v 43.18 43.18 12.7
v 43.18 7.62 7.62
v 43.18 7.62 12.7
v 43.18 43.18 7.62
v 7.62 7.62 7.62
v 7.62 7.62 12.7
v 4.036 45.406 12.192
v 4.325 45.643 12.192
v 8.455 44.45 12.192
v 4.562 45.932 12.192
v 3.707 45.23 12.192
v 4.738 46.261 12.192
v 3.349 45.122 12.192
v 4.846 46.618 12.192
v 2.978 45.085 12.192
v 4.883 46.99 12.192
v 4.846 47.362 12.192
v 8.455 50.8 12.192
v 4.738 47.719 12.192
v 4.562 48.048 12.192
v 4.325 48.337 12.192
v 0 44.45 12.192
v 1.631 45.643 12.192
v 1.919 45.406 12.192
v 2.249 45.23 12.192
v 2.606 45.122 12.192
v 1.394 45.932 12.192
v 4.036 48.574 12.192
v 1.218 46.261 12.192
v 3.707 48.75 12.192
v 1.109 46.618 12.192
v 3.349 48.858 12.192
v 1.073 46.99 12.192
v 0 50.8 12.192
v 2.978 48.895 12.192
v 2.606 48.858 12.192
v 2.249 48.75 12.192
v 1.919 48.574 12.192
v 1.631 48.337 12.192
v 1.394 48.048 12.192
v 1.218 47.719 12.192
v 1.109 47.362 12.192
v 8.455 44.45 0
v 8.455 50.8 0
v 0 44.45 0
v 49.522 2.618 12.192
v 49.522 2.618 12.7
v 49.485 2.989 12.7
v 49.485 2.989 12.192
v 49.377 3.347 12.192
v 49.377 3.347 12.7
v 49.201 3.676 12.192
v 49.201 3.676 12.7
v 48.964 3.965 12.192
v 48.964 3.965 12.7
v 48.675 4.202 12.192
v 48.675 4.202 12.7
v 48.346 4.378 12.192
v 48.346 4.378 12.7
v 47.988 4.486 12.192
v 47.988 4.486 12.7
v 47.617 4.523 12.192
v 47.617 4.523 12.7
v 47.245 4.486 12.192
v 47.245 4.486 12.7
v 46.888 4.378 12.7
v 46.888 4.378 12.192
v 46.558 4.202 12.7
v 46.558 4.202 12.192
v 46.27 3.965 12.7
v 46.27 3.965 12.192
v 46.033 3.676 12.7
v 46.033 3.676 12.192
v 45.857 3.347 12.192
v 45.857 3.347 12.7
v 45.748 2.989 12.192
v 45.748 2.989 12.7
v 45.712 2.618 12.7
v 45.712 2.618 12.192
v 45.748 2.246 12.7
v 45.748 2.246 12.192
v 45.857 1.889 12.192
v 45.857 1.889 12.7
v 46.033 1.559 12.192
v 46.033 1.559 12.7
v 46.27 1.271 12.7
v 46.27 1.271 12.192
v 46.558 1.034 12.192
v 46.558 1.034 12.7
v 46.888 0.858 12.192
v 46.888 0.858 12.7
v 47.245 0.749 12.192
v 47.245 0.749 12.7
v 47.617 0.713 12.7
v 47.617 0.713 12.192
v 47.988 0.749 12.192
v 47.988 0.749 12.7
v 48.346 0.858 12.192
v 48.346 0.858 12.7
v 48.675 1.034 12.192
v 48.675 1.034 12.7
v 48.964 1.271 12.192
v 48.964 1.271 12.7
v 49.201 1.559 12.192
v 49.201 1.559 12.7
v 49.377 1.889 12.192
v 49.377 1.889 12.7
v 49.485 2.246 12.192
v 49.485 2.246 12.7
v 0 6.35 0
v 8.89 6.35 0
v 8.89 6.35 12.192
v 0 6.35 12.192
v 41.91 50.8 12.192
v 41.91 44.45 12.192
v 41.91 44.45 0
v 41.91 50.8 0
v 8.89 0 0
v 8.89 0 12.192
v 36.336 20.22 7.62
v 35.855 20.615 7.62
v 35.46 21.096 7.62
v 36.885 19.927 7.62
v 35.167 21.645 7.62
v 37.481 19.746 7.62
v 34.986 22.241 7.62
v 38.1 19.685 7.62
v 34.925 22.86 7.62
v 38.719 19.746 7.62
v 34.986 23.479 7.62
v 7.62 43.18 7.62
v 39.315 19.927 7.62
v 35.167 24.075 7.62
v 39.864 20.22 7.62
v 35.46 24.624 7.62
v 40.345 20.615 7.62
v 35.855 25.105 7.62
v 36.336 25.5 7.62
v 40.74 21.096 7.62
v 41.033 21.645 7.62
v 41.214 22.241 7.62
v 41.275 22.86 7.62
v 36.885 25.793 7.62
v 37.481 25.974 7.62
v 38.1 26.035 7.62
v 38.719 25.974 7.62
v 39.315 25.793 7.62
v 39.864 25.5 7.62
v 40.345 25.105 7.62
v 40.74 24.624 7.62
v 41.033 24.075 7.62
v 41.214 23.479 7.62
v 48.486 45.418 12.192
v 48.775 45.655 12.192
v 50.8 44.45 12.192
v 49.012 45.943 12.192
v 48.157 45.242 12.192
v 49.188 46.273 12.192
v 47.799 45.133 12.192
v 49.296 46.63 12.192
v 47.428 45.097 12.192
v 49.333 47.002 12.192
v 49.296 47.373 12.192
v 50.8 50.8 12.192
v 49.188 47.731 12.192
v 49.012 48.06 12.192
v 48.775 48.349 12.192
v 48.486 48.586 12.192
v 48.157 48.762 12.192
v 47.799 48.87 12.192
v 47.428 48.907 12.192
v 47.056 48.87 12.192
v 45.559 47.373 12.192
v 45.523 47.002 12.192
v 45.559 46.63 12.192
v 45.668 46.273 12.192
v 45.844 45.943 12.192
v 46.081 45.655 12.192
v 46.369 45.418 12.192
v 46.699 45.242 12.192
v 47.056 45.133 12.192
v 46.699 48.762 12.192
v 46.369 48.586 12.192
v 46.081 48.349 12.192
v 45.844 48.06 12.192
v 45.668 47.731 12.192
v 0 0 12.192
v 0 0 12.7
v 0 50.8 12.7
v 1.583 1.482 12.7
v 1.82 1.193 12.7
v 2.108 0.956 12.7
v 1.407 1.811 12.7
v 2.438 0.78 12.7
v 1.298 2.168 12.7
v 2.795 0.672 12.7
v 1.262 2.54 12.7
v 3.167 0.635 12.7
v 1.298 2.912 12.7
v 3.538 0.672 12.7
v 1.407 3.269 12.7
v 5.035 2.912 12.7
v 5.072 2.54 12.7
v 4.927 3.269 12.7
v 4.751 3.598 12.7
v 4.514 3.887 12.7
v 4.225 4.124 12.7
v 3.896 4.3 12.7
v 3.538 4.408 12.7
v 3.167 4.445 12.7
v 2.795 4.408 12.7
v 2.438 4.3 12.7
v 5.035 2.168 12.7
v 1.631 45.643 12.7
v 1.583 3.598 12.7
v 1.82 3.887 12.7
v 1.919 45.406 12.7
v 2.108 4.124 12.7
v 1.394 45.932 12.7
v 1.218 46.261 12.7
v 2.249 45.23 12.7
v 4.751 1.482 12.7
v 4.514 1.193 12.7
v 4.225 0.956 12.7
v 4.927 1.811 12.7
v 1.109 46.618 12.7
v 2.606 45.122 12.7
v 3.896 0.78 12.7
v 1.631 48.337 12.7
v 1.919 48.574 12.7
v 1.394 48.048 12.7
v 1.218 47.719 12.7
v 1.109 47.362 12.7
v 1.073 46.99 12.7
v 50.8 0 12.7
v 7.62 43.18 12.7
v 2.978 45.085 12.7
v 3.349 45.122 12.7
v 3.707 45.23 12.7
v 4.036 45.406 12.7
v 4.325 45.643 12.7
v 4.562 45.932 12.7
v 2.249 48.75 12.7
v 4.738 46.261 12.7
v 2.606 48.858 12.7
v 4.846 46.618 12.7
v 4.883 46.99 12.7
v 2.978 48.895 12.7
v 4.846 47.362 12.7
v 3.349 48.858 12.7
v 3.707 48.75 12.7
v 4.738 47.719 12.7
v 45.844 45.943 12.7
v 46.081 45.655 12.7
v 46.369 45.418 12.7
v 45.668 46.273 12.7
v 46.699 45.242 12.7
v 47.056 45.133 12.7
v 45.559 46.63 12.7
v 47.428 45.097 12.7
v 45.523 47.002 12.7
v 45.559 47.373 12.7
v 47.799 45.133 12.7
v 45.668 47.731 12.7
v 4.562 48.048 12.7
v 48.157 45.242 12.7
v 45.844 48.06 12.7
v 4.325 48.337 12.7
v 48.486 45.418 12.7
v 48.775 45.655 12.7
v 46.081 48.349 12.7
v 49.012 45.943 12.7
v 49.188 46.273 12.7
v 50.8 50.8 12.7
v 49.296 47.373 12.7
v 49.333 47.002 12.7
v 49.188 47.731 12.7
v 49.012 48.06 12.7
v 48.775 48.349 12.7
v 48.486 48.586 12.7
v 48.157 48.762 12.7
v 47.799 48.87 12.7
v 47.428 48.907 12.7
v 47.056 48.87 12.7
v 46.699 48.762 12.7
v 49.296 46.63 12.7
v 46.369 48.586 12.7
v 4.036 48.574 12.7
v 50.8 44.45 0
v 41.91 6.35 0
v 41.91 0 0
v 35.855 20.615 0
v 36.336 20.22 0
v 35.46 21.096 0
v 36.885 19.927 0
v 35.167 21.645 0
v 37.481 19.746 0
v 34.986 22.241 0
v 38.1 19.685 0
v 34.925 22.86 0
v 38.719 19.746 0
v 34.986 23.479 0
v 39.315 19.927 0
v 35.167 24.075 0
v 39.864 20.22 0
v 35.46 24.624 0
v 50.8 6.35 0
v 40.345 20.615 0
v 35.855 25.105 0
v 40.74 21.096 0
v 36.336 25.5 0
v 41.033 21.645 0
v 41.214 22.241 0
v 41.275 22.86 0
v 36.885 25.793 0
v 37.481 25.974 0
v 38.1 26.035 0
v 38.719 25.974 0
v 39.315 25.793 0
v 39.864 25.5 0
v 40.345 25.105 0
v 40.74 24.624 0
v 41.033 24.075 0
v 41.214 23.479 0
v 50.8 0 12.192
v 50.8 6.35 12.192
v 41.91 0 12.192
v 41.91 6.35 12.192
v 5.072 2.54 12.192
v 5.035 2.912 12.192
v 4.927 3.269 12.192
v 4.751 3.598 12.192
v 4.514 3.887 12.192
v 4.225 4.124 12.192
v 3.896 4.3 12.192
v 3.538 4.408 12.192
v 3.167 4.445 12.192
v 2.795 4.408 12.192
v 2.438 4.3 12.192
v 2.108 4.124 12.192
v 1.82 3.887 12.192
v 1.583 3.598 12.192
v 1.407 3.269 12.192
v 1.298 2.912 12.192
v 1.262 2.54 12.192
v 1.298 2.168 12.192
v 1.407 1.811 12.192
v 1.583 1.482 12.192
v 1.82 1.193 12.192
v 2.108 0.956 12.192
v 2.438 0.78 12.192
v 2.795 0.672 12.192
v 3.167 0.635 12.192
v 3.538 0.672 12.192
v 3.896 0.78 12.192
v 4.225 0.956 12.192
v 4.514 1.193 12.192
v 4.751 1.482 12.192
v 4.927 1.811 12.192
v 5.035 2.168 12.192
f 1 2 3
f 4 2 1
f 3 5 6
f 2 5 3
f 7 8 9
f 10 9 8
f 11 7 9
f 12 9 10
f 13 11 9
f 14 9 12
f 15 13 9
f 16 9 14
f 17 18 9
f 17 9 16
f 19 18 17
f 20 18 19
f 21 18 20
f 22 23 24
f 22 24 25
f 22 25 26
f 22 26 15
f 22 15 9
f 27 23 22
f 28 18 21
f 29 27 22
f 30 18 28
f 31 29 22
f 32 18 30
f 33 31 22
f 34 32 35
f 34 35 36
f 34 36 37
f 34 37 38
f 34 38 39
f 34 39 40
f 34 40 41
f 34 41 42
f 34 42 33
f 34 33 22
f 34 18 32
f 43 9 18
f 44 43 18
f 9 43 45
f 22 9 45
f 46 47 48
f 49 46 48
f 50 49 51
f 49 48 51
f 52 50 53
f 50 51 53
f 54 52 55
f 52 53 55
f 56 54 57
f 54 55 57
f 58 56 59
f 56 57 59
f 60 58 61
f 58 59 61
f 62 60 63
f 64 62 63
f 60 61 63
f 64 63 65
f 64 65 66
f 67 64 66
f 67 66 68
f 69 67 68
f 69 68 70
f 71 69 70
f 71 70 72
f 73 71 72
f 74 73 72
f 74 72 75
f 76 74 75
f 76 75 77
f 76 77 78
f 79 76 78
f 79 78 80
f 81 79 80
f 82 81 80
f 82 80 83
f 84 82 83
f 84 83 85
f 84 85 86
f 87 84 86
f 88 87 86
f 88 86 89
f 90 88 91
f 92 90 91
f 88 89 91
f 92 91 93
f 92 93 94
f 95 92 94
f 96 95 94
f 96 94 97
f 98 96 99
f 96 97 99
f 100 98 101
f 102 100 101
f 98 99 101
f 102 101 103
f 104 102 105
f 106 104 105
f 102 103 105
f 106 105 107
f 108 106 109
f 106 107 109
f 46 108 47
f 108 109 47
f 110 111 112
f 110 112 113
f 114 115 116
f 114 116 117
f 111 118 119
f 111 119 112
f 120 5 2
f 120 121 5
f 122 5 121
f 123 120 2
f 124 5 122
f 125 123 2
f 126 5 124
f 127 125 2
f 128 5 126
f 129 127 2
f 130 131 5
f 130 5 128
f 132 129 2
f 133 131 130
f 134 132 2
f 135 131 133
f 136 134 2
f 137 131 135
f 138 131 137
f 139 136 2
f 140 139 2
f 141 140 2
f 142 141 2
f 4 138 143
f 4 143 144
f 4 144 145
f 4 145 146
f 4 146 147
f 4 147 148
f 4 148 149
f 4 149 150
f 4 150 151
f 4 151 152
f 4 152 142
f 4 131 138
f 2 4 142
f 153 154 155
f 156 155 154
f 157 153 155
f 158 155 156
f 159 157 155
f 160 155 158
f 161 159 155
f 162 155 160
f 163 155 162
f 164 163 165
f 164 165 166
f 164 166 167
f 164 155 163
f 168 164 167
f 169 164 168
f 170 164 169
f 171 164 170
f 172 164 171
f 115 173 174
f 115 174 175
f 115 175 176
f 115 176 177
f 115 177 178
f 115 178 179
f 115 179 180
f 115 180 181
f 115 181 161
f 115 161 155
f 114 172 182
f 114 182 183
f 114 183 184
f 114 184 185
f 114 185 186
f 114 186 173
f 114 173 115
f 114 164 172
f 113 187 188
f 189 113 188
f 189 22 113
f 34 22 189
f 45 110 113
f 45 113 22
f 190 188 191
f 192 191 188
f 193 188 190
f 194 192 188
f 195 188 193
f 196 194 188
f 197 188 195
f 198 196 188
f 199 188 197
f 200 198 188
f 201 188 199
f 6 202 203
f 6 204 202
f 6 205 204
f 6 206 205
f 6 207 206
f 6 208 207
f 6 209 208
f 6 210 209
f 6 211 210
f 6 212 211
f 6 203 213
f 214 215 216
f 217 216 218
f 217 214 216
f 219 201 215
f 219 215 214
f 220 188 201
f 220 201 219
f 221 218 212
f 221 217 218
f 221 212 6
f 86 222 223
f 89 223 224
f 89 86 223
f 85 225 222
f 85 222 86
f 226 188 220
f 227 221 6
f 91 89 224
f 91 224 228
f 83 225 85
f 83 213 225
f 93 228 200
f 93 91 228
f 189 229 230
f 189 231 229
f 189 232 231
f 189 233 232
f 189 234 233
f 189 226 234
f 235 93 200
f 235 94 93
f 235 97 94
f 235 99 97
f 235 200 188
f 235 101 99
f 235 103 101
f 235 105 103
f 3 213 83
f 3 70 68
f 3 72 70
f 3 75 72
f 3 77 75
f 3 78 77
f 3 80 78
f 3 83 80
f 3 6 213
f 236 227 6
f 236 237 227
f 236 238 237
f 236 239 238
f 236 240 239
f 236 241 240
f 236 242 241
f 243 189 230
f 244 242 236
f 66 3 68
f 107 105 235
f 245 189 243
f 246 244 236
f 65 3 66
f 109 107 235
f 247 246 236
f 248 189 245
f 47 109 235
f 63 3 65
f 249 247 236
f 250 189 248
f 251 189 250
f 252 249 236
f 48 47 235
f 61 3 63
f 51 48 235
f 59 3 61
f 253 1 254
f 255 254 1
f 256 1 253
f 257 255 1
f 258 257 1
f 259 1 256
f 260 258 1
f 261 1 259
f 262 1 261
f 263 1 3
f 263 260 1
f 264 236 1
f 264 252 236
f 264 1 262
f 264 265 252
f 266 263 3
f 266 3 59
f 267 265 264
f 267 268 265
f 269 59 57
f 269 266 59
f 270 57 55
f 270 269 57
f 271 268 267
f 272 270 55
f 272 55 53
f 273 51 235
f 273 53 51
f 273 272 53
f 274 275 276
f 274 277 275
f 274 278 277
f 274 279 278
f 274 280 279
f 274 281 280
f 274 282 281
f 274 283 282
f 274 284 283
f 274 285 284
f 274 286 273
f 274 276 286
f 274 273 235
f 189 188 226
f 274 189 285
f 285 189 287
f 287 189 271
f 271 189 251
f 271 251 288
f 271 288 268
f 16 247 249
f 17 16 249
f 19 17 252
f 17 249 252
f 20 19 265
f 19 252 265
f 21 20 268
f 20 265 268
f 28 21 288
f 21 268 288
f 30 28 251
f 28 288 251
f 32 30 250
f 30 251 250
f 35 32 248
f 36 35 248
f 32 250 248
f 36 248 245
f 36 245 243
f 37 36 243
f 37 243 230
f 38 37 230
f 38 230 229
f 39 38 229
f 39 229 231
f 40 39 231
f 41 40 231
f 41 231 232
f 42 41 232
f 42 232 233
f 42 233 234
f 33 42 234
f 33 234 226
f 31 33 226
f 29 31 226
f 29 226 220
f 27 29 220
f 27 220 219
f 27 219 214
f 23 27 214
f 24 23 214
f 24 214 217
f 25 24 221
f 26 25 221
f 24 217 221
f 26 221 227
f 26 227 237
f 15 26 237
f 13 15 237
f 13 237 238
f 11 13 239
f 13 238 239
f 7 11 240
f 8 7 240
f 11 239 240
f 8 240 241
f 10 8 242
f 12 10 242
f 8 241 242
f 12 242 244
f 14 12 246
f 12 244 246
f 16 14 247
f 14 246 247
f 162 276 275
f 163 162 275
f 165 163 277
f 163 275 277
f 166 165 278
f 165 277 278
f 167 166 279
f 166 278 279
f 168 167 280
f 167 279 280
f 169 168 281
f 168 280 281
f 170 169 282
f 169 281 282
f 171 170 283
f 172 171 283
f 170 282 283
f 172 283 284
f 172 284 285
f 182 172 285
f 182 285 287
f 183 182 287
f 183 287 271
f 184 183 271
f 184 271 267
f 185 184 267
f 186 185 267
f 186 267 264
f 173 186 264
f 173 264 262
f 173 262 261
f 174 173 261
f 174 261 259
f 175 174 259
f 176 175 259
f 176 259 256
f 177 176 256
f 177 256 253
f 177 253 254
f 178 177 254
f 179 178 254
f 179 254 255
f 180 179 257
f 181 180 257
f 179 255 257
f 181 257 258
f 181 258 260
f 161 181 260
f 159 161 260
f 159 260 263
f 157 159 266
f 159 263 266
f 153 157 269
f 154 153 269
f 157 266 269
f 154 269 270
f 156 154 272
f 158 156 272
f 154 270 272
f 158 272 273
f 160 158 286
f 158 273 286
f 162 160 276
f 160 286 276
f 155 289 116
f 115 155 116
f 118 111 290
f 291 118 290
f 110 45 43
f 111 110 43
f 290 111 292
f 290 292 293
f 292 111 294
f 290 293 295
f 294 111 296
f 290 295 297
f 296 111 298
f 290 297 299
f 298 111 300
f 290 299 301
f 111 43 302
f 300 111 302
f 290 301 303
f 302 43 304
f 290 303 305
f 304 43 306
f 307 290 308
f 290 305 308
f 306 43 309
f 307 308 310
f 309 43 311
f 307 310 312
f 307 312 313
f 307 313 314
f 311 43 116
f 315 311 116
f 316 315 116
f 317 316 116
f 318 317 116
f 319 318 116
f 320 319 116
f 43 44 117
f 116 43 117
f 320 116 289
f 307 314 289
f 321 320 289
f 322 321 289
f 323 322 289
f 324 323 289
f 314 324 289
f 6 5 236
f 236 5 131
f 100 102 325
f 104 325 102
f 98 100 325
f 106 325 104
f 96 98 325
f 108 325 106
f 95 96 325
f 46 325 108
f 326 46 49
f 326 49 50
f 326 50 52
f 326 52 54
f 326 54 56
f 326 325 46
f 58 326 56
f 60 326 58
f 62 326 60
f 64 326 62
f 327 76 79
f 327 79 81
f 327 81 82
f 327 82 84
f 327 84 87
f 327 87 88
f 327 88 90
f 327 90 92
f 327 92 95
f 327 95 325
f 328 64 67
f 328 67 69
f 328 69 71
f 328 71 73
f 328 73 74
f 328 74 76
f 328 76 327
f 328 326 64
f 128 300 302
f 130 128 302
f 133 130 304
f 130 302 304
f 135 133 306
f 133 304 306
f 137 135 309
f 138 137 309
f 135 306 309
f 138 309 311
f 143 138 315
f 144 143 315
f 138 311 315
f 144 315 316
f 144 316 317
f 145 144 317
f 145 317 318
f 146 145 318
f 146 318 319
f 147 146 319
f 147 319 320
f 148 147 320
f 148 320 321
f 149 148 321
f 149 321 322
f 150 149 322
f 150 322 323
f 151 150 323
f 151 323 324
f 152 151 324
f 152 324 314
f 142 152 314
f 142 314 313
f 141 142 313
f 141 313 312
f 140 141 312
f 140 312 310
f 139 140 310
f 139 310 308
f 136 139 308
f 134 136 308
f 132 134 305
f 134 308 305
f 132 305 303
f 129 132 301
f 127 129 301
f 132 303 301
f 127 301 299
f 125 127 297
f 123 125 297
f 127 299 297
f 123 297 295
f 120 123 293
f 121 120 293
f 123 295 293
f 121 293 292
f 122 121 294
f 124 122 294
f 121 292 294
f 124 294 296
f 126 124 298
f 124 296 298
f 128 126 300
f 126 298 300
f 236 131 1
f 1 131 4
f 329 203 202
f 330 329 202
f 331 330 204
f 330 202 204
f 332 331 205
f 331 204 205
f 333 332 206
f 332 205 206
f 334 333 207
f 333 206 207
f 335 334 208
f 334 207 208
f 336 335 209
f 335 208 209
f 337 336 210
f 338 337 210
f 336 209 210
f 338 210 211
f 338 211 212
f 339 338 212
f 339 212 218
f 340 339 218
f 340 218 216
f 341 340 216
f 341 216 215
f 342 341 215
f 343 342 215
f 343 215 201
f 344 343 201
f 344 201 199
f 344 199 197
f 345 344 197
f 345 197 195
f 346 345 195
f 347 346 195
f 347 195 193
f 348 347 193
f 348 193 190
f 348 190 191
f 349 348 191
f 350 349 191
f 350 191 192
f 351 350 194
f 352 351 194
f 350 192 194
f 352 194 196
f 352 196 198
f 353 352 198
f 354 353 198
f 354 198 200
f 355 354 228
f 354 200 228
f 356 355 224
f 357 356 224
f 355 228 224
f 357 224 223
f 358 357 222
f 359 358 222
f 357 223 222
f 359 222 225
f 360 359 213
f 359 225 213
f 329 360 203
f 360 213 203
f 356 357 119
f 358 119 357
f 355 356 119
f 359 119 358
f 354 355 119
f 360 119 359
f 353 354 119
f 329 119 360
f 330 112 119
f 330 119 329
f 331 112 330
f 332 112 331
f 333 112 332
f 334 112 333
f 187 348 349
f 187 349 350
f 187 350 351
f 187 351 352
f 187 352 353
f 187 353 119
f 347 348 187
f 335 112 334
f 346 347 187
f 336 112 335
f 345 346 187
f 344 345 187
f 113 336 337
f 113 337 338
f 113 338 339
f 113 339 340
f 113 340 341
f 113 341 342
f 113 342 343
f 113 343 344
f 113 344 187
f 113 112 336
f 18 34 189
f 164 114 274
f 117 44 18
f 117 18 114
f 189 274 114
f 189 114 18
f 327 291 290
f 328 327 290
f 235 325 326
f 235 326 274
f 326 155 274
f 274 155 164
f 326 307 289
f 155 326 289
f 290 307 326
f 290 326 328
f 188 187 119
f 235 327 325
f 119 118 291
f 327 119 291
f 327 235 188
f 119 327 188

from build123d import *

# Parameters (mm, degrees)
SKETCH1_W           = 50.8
SKETCH1_H           = 50.8
BOSS_EXTRUDE1_DEPTH = 12.7
SHELL1_T            = -7.62
SKETCH3_W           = 8.89
SKETCH3_H           = 6.35
SKETCH3_W_2         = 8.455127559
CUT_EXTRUDE2_DEPTH  = 12.192
SKETCH4_R           = 1.905
CUT_EXTRUDE3_DEPTH  = 20.574
SKETCH6_R           = 3.175
CUT_EXTRUDE5_DEPTH  = 8.89


with BuildPart() as part:
    # Sketch1 → Boss-Extrude1 (new body)
    with BuildSketch(Plane.XY):
        with Locations((25.4, 25.4)):
            Rectangle(SKETCH1_W, SKETCH1_H)
    extrude(amount=BOSS_EXTRUDE1_DEPTH)

    # Shell1
    shell1_openings = [part.faces().sort_by_distance(p)[0] for p in [
        (25.4, 25.4, 12.7),
    ]]
    offset(amount=SHELL1_T, openings=shell1_openings, kind=Kind.INTERSECTION)

    # Sketch3 → Cut-Extrude2 (cut)
    with BuildSketch(Plane(origin=(0, 0, 0), x_dir=(-1, 0, 0), z_dir=(0, 0, -1))):
        with Locations((-46.355, 47.625)):
            Rectangle(SKETCH3_W, SKETCH3_H)
        with Locations((-46.355, 3.175)):
            Rectangle(SKETCH3_W, SKETCH3_H)
        with Locations((-4.445, 3.175)):
            Rectangle(SKETCH3_W, SKETCH3_H)
        with Locations((-4.22756378, 47.625)):
            Rectangle(SKETCH3_W_2, SKETCH3_H)
    extrude(amount=-CUT_EXTRUDE2_DEPTH, mode=Mode.SUBTRACT)

    # Sketch4 → Cut-Extrude3 (cut)
    with BuildSketch(Plane.XY.offset(12.7)):
        with Locations((2.97778213, 46.99)):
            Circle(SKETCH4_R)
        with Locations((47.42778213, 47.001802338)):
            Circle(SKETCH4_R)
        with Locations((3.166736342, 2.54)):
            Circle(SKETCH4_R)
        with Locations((47.616736342, 2.617819139)):
            Circle(SKETCH4_R)
    extrude(amount=-CUT_EXTRUDE3_DEPTH, mode=Mode.SUBTRACT)

    # Sketch6 → Cut-Extrude5 (cut)
    with BuildSketch(Plane(origin=(0, 0, 0), x_dir=(-1, 0, 0), z_dir=(0, 0, -1))):
        with Locations((-38.1, 22.86)):
            Circle(SKETCH6_R)
    extrude(amount=-CUT_EXTRUDE5_DEPTH, mode=Mode.SUBTRACT)


solid = part.part
